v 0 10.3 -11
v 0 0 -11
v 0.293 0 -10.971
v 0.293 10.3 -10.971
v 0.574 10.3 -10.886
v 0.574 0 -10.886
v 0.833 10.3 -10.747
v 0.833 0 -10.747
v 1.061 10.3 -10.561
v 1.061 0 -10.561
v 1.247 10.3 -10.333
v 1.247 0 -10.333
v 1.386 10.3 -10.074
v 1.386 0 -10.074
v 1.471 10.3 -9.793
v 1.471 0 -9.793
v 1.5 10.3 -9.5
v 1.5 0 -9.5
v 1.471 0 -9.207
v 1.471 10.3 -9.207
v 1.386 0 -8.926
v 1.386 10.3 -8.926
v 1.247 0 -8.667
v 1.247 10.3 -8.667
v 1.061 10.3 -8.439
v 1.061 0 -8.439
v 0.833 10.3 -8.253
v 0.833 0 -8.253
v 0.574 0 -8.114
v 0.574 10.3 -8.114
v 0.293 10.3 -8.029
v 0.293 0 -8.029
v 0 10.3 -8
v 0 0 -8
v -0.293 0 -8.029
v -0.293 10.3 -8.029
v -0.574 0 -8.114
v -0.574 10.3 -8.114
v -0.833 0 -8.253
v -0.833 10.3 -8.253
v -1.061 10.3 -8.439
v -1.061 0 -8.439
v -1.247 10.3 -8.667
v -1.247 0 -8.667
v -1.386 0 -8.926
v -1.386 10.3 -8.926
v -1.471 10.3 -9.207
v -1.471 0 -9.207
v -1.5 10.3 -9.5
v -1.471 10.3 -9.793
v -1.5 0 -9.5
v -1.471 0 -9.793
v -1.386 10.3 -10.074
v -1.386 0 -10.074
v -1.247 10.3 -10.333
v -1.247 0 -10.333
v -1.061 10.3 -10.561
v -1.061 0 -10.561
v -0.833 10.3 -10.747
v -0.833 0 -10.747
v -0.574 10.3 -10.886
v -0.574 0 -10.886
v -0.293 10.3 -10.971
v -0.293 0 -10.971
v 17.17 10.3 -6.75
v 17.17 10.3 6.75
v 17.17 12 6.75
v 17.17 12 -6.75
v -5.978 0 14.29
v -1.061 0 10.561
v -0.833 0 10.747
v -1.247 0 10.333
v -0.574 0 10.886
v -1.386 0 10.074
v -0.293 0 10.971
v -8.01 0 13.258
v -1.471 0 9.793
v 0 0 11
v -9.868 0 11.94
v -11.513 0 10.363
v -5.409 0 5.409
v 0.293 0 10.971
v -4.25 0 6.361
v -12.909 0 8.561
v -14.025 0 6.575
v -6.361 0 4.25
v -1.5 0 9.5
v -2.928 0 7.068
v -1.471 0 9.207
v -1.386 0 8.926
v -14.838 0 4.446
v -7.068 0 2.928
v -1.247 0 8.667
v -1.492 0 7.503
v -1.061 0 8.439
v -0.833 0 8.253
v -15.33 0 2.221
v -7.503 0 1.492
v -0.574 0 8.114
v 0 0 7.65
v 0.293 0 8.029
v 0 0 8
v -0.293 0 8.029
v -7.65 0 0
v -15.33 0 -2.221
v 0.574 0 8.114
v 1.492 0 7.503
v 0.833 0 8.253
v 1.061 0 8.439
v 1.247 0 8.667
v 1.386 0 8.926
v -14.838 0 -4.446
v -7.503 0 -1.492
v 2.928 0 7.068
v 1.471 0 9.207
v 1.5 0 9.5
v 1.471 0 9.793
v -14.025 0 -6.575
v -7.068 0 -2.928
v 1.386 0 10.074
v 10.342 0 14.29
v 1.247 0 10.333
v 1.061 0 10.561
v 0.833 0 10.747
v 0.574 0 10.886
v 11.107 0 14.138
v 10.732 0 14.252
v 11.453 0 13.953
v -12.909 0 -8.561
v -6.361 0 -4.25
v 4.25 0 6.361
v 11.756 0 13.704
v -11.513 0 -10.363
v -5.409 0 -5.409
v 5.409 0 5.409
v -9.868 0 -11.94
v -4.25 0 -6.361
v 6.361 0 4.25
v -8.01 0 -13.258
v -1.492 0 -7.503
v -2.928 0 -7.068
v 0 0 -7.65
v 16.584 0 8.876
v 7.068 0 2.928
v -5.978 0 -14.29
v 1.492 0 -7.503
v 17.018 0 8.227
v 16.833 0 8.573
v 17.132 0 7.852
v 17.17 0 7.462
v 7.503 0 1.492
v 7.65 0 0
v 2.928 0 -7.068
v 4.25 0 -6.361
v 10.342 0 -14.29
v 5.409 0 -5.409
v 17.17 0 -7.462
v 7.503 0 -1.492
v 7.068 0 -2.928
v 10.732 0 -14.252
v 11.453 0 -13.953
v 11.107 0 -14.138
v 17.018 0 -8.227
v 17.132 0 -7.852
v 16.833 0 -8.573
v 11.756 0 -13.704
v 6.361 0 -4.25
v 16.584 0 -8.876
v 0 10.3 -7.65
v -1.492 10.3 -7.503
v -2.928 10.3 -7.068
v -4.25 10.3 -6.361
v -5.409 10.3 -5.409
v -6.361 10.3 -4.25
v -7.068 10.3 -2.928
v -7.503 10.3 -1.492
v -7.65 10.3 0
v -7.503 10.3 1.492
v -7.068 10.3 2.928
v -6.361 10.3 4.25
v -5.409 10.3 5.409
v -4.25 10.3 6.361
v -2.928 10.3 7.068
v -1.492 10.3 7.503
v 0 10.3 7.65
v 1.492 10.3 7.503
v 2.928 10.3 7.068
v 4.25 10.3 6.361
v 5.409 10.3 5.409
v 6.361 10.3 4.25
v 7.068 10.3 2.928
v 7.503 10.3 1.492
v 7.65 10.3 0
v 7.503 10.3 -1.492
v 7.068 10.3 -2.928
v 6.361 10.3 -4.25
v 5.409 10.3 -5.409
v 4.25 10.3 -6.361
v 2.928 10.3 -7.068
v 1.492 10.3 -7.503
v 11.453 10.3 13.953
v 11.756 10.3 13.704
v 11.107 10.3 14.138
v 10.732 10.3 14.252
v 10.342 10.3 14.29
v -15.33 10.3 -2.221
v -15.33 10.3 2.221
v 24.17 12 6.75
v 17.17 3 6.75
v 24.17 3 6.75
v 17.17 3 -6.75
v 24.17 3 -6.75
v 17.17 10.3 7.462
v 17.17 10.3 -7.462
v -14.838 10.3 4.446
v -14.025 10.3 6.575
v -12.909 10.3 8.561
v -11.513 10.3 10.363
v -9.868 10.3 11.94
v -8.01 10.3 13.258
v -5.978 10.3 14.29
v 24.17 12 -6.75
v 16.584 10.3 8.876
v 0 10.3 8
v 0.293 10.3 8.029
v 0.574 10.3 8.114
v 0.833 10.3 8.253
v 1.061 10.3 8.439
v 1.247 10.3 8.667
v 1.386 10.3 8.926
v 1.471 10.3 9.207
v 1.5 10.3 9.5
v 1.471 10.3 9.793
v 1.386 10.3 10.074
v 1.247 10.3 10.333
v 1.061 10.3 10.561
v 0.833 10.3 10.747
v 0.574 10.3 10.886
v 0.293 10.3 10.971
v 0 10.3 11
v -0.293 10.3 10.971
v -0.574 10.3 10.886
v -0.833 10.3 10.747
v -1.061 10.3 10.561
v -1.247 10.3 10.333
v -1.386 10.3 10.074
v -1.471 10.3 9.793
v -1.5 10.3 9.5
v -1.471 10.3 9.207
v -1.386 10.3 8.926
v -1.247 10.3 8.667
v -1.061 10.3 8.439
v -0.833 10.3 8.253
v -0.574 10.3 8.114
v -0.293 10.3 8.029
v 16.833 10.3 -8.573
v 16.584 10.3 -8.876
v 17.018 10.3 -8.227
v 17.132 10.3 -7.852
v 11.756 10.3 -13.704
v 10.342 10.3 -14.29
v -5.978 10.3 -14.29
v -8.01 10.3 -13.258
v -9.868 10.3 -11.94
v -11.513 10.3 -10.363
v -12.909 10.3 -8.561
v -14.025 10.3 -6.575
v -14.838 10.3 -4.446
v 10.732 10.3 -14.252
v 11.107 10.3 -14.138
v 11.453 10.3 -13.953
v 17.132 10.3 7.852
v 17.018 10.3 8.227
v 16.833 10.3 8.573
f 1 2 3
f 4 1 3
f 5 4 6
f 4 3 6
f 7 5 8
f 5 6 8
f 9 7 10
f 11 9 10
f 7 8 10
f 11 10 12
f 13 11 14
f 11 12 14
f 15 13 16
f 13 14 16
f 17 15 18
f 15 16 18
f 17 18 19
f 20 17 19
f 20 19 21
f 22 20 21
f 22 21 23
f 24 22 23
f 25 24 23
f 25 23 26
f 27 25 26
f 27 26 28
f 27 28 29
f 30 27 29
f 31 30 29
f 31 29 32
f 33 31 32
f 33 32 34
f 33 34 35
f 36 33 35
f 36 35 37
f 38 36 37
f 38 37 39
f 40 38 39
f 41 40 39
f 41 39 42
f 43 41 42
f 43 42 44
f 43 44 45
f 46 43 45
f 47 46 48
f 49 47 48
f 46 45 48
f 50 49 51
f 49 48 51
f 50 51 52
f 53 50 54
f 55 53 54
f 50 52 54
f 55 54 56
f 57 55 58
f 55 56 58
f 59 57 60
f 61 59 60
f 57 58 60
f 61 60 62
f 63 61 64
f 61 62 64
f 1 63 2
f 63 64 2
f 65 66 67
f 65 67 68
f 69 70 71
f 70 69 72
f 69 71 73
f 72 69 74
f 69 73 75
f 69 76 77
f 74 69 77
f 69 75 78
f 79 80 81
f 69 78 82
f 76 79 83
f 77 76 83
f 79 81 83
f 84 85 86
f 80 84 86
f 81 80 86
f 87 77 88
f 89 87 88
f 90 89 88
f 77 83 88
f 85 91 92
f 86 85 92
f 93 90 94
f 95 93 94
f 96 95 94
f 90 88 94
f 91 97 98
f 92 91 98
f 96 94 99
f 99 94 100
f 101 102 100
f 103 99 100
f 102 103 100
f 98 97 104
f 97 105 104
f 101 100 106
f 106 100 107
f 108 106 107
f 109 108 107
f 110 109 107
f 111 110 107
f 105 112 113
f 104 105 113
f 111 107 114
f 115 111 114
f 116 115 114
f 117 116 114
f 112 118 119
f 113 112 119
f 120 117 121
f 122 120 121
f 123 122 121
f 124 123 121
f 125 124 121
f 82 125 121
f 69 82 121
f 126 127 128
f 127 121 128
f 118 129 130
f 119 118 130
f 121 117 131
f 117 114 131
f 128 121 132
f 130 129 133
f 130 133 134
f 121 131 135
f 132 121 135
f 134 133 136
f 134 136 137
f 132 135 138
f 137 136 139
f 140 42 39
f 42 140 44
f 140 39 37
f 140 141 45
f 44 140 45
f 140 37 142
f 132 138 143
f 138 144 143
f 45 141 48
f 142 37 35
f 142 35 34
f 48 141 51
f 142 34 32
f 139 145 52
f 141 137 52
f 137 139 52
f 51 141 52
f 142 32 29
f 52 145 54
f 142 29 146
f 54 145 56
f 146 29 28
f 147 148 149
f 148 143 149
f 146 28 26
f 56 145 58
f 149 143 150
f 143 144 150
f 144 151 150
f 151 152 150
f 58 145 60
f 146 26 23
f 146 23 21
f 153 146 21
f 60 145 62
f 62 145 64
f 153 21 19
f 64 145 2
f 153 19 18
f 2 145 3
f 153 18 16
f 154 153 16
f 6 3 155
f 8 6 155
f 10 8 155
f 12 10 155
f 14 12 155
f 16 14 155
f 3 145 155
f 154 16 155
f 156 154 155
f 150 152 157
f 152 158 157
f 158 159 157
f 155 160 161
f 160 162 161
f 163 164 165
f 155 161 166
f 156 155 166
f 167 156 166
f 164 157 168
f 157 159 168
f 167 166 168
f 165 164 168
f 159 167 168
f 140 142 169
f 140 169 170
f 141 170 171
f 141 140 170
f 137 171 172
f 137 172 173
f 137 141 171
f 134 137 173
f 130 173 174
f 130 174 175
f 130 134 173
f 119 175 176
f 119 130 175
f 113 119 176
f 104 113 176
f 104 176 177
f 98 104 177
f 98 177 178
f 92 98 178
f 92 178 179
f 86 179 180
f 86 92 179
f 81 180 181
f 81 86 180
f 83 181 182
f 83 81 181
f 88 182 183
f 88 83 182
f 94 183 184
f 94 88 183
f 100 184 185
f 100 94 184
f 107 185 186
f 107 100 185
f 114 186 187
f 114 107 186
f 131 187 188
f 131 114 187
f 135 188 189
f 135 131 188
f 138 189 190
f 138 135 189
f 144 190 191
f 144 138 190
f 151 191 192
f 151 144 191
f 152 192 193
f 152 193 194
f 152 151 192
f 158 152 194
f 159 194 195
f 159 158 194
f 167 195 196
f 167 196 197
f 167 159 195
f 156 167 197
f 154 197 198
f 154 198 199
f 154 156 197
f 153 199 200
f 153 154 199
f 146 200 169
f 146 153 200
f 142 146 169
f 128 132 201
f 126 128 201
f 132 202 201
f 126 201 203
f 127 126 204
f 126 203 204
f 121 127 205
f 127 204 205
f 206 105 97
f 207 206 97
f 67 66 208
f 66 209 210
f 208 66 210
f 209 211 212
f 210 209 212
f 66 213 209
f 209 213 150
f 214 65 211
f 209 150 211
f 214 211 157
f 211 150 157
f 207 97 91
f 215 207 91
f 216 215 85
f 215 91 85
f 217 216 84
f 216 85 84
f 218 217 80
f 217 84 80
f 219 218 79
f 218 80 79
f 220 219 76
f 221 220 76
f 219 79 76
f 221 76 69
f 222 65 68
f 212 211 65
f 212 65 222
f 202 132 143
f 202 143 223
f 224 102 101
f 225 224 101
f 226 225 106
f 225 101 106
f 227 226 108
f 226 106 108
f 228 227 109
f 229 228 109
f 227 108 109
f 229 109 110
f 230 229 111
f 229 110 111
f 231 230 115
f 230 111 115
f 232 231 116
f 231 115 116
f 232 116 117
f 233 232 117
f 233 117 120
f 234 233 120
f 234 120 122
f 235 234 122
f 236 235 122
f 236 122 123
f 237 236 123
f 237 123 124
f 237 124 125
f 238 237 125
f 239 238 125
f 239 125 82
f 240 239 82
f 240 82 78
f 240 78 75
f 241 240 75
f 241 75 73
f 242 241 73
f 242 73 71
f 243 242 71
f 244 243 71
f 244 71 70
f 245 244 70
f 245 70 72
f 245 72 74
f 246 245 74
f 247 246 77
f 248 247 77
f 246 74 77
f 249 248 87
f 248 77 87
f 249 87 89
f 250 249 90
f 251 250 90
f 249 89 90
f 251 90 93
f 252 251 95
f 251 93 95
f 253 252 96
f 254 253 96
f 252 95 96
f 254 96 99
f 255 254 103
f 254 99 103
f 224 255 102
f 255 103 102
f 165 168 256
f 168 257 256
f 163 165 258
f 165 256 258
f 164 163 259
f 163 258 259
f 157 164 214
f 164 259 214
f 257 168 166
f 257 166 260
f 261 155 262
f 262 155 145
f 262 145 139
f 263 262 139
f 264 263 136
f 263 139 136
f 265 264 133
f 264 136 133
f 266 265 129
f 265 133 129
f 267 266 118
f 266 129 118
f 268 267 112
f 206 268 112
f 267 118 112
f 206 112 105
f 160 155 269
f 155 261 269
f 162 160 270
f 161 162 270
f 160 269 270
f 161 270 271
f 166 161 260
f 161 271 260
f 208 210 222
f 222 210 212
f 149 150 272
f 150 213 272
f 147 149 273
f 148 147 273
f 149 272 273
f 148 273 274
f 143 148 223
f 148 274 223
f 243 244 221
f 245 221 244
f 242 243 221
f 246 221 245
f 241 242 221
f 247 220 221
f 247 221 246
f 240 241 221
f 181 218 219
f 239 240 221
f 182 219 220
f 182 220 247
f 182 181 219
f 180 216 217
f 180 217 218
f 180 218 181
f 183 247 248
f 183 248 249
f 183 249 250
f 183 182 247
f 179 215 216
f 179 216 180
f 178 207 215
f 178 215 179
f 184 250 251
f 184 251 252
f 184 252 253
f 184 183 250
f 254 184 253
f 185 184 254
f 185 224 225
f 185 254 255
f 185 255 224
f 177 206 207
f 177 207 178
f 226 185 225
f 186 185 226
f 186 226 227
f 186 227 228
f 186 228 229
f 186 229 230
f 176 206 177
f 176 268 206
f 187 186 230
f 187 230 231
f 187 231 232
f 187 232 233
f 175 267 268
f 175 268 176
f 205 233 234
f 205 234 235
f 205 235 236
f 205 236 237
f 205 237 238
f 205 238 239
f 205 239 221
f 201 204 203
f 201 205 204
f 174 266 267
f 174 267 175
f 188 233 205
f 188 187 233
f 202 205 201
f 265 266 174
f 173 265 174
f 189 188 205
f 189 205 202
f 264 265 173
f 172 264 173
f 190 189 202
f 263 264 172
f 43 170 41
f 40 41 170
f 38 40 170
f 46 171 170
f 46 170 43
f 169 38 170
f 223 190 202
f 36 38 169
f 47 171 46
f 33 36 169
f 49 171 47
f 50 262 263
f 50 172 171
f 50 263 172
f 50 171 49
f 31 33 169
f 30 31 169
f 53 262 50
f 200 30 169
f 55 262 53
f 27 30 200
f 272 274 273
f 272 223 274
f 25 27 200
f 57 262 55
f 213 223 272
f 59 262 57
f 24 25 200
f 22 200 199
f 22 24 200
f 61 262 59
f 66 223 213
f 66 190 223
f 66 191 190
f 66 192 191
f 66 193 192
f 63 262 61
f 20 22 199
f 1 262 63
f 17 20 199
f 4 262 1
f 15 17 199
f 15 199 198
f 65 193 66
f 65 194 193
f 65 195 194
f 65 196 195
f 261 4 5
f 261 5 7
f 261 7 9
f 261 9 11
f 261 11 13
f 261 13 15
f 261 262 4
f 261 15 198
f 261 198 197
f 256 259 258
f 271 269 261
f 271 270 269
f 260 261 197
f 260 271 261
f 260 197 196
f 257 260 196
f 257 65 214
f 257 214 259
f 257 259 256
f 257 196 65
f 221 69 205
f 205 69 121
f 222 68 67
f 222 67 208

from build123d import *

# Parameters (mm, degrees)
SKETCH_1_R          = 7.65
EXTRUDE_1_DEPTH     = 10.3
SKETCH_2_R          = 1.5
CUT_EXTRUDE_1_DEPTH = 10.5
CHAMFER_1_SIZE      = 6
FILLET_1_R          = 2
EXTRUDE_START       = 3
SKETCH_4_W          = 7
SKETCH_4_H          = 13.5
EXTRUDE_2_DEPTH     = 9


with BuildPart() as part:
    # ｽｹｯﾁ1 → ﾎﾞｽ - 押し出し1 (new body)
    with BuildSketch(Plane(origin=(0, 0, 0), x_dir=(1, 0, 0), z_dir=(0, 1, 0))):
        with BuildLine():
            Line((17.17, 14.29), (-5.977959518, 14.29))
            ThreePointArc((-5.977959518, 14.29), (-12.244374402, 9.48764436), (-15.33, 2.220630541))
            Line((-15.33, 2.220630541), (-15.33, -2.220630541))
            ThreePointArc((-15.33, -2.220630541), (-12.244374402, -9.48764436), (-5.977959518, -14.29))
            Line((-5.977959518, -14.29), (17.17, -14.29))
            Line((17.17, -14.29), (17.17, 14.29))
        make_face()
        with Locations(Location((0, 0, 0), (0, 0, 90))):
            Circle(SKETCH_1_R, mode=Mode.SUBTRACT)
    extrude(amount=EXTRUDE_1_DEPTH)

    # ｽｹｯﾁ2 → ｶｯﾄ - 押し出し1 (cut)
    with BuildSketch(Plane.XZ):
        with Locations(Location((0, 9.5, 0), (0, 0, 270))):
            Circle(SKETCH_2_R)
        with Locations(Location((0, -9.5, 0), (0, 0, 270))):
            Circle(SKETCH_2_R)
    extrude(amount=-CUT_EXTRUDE_1_DEPTH, mode=Mode.SUBTRACT)

    # 面取り1
    chamfer_1_edges = [part.edges().sort_by_distance(p)[0] for p in [
        (17.17, 5.15, -14.29),
        (17.17, 5.15, 14.29),
    ]]
    chamfer(chamfer_1_edges, length=CHAMFER_1_SIZE)

    # ﾌｨﾚｯﾄ1
    fillet_1_edges = [part.edges().sort_by_distance(p)[0] for p in [
        (11.17, 5.15, -14.29),
        (17.17, 5.15, 8.29),
        (17.17, 5.15, -8.29),
        (11.17, 5.15, 14.29),
    ]]
    fillet(fillet_1_edges, radius=FILLET_1_R)

    # ｽｹｯﾁ4 → ﾎﾞｽ - 押し出し2 (add)
    with BuildSketch(Plane(origin=(0, 0, 0), x_dir=(1, 0, 0), z_dir=(0, 1, 0)).offset(EXTRUDE_START)):
        with Locations((20.67, 0)):
            Rectangle(SKETCH_4_W, SKETCH_4_H)
    extrude(amount=EXTRUDE_2_DEPTH)


solid = part.part
